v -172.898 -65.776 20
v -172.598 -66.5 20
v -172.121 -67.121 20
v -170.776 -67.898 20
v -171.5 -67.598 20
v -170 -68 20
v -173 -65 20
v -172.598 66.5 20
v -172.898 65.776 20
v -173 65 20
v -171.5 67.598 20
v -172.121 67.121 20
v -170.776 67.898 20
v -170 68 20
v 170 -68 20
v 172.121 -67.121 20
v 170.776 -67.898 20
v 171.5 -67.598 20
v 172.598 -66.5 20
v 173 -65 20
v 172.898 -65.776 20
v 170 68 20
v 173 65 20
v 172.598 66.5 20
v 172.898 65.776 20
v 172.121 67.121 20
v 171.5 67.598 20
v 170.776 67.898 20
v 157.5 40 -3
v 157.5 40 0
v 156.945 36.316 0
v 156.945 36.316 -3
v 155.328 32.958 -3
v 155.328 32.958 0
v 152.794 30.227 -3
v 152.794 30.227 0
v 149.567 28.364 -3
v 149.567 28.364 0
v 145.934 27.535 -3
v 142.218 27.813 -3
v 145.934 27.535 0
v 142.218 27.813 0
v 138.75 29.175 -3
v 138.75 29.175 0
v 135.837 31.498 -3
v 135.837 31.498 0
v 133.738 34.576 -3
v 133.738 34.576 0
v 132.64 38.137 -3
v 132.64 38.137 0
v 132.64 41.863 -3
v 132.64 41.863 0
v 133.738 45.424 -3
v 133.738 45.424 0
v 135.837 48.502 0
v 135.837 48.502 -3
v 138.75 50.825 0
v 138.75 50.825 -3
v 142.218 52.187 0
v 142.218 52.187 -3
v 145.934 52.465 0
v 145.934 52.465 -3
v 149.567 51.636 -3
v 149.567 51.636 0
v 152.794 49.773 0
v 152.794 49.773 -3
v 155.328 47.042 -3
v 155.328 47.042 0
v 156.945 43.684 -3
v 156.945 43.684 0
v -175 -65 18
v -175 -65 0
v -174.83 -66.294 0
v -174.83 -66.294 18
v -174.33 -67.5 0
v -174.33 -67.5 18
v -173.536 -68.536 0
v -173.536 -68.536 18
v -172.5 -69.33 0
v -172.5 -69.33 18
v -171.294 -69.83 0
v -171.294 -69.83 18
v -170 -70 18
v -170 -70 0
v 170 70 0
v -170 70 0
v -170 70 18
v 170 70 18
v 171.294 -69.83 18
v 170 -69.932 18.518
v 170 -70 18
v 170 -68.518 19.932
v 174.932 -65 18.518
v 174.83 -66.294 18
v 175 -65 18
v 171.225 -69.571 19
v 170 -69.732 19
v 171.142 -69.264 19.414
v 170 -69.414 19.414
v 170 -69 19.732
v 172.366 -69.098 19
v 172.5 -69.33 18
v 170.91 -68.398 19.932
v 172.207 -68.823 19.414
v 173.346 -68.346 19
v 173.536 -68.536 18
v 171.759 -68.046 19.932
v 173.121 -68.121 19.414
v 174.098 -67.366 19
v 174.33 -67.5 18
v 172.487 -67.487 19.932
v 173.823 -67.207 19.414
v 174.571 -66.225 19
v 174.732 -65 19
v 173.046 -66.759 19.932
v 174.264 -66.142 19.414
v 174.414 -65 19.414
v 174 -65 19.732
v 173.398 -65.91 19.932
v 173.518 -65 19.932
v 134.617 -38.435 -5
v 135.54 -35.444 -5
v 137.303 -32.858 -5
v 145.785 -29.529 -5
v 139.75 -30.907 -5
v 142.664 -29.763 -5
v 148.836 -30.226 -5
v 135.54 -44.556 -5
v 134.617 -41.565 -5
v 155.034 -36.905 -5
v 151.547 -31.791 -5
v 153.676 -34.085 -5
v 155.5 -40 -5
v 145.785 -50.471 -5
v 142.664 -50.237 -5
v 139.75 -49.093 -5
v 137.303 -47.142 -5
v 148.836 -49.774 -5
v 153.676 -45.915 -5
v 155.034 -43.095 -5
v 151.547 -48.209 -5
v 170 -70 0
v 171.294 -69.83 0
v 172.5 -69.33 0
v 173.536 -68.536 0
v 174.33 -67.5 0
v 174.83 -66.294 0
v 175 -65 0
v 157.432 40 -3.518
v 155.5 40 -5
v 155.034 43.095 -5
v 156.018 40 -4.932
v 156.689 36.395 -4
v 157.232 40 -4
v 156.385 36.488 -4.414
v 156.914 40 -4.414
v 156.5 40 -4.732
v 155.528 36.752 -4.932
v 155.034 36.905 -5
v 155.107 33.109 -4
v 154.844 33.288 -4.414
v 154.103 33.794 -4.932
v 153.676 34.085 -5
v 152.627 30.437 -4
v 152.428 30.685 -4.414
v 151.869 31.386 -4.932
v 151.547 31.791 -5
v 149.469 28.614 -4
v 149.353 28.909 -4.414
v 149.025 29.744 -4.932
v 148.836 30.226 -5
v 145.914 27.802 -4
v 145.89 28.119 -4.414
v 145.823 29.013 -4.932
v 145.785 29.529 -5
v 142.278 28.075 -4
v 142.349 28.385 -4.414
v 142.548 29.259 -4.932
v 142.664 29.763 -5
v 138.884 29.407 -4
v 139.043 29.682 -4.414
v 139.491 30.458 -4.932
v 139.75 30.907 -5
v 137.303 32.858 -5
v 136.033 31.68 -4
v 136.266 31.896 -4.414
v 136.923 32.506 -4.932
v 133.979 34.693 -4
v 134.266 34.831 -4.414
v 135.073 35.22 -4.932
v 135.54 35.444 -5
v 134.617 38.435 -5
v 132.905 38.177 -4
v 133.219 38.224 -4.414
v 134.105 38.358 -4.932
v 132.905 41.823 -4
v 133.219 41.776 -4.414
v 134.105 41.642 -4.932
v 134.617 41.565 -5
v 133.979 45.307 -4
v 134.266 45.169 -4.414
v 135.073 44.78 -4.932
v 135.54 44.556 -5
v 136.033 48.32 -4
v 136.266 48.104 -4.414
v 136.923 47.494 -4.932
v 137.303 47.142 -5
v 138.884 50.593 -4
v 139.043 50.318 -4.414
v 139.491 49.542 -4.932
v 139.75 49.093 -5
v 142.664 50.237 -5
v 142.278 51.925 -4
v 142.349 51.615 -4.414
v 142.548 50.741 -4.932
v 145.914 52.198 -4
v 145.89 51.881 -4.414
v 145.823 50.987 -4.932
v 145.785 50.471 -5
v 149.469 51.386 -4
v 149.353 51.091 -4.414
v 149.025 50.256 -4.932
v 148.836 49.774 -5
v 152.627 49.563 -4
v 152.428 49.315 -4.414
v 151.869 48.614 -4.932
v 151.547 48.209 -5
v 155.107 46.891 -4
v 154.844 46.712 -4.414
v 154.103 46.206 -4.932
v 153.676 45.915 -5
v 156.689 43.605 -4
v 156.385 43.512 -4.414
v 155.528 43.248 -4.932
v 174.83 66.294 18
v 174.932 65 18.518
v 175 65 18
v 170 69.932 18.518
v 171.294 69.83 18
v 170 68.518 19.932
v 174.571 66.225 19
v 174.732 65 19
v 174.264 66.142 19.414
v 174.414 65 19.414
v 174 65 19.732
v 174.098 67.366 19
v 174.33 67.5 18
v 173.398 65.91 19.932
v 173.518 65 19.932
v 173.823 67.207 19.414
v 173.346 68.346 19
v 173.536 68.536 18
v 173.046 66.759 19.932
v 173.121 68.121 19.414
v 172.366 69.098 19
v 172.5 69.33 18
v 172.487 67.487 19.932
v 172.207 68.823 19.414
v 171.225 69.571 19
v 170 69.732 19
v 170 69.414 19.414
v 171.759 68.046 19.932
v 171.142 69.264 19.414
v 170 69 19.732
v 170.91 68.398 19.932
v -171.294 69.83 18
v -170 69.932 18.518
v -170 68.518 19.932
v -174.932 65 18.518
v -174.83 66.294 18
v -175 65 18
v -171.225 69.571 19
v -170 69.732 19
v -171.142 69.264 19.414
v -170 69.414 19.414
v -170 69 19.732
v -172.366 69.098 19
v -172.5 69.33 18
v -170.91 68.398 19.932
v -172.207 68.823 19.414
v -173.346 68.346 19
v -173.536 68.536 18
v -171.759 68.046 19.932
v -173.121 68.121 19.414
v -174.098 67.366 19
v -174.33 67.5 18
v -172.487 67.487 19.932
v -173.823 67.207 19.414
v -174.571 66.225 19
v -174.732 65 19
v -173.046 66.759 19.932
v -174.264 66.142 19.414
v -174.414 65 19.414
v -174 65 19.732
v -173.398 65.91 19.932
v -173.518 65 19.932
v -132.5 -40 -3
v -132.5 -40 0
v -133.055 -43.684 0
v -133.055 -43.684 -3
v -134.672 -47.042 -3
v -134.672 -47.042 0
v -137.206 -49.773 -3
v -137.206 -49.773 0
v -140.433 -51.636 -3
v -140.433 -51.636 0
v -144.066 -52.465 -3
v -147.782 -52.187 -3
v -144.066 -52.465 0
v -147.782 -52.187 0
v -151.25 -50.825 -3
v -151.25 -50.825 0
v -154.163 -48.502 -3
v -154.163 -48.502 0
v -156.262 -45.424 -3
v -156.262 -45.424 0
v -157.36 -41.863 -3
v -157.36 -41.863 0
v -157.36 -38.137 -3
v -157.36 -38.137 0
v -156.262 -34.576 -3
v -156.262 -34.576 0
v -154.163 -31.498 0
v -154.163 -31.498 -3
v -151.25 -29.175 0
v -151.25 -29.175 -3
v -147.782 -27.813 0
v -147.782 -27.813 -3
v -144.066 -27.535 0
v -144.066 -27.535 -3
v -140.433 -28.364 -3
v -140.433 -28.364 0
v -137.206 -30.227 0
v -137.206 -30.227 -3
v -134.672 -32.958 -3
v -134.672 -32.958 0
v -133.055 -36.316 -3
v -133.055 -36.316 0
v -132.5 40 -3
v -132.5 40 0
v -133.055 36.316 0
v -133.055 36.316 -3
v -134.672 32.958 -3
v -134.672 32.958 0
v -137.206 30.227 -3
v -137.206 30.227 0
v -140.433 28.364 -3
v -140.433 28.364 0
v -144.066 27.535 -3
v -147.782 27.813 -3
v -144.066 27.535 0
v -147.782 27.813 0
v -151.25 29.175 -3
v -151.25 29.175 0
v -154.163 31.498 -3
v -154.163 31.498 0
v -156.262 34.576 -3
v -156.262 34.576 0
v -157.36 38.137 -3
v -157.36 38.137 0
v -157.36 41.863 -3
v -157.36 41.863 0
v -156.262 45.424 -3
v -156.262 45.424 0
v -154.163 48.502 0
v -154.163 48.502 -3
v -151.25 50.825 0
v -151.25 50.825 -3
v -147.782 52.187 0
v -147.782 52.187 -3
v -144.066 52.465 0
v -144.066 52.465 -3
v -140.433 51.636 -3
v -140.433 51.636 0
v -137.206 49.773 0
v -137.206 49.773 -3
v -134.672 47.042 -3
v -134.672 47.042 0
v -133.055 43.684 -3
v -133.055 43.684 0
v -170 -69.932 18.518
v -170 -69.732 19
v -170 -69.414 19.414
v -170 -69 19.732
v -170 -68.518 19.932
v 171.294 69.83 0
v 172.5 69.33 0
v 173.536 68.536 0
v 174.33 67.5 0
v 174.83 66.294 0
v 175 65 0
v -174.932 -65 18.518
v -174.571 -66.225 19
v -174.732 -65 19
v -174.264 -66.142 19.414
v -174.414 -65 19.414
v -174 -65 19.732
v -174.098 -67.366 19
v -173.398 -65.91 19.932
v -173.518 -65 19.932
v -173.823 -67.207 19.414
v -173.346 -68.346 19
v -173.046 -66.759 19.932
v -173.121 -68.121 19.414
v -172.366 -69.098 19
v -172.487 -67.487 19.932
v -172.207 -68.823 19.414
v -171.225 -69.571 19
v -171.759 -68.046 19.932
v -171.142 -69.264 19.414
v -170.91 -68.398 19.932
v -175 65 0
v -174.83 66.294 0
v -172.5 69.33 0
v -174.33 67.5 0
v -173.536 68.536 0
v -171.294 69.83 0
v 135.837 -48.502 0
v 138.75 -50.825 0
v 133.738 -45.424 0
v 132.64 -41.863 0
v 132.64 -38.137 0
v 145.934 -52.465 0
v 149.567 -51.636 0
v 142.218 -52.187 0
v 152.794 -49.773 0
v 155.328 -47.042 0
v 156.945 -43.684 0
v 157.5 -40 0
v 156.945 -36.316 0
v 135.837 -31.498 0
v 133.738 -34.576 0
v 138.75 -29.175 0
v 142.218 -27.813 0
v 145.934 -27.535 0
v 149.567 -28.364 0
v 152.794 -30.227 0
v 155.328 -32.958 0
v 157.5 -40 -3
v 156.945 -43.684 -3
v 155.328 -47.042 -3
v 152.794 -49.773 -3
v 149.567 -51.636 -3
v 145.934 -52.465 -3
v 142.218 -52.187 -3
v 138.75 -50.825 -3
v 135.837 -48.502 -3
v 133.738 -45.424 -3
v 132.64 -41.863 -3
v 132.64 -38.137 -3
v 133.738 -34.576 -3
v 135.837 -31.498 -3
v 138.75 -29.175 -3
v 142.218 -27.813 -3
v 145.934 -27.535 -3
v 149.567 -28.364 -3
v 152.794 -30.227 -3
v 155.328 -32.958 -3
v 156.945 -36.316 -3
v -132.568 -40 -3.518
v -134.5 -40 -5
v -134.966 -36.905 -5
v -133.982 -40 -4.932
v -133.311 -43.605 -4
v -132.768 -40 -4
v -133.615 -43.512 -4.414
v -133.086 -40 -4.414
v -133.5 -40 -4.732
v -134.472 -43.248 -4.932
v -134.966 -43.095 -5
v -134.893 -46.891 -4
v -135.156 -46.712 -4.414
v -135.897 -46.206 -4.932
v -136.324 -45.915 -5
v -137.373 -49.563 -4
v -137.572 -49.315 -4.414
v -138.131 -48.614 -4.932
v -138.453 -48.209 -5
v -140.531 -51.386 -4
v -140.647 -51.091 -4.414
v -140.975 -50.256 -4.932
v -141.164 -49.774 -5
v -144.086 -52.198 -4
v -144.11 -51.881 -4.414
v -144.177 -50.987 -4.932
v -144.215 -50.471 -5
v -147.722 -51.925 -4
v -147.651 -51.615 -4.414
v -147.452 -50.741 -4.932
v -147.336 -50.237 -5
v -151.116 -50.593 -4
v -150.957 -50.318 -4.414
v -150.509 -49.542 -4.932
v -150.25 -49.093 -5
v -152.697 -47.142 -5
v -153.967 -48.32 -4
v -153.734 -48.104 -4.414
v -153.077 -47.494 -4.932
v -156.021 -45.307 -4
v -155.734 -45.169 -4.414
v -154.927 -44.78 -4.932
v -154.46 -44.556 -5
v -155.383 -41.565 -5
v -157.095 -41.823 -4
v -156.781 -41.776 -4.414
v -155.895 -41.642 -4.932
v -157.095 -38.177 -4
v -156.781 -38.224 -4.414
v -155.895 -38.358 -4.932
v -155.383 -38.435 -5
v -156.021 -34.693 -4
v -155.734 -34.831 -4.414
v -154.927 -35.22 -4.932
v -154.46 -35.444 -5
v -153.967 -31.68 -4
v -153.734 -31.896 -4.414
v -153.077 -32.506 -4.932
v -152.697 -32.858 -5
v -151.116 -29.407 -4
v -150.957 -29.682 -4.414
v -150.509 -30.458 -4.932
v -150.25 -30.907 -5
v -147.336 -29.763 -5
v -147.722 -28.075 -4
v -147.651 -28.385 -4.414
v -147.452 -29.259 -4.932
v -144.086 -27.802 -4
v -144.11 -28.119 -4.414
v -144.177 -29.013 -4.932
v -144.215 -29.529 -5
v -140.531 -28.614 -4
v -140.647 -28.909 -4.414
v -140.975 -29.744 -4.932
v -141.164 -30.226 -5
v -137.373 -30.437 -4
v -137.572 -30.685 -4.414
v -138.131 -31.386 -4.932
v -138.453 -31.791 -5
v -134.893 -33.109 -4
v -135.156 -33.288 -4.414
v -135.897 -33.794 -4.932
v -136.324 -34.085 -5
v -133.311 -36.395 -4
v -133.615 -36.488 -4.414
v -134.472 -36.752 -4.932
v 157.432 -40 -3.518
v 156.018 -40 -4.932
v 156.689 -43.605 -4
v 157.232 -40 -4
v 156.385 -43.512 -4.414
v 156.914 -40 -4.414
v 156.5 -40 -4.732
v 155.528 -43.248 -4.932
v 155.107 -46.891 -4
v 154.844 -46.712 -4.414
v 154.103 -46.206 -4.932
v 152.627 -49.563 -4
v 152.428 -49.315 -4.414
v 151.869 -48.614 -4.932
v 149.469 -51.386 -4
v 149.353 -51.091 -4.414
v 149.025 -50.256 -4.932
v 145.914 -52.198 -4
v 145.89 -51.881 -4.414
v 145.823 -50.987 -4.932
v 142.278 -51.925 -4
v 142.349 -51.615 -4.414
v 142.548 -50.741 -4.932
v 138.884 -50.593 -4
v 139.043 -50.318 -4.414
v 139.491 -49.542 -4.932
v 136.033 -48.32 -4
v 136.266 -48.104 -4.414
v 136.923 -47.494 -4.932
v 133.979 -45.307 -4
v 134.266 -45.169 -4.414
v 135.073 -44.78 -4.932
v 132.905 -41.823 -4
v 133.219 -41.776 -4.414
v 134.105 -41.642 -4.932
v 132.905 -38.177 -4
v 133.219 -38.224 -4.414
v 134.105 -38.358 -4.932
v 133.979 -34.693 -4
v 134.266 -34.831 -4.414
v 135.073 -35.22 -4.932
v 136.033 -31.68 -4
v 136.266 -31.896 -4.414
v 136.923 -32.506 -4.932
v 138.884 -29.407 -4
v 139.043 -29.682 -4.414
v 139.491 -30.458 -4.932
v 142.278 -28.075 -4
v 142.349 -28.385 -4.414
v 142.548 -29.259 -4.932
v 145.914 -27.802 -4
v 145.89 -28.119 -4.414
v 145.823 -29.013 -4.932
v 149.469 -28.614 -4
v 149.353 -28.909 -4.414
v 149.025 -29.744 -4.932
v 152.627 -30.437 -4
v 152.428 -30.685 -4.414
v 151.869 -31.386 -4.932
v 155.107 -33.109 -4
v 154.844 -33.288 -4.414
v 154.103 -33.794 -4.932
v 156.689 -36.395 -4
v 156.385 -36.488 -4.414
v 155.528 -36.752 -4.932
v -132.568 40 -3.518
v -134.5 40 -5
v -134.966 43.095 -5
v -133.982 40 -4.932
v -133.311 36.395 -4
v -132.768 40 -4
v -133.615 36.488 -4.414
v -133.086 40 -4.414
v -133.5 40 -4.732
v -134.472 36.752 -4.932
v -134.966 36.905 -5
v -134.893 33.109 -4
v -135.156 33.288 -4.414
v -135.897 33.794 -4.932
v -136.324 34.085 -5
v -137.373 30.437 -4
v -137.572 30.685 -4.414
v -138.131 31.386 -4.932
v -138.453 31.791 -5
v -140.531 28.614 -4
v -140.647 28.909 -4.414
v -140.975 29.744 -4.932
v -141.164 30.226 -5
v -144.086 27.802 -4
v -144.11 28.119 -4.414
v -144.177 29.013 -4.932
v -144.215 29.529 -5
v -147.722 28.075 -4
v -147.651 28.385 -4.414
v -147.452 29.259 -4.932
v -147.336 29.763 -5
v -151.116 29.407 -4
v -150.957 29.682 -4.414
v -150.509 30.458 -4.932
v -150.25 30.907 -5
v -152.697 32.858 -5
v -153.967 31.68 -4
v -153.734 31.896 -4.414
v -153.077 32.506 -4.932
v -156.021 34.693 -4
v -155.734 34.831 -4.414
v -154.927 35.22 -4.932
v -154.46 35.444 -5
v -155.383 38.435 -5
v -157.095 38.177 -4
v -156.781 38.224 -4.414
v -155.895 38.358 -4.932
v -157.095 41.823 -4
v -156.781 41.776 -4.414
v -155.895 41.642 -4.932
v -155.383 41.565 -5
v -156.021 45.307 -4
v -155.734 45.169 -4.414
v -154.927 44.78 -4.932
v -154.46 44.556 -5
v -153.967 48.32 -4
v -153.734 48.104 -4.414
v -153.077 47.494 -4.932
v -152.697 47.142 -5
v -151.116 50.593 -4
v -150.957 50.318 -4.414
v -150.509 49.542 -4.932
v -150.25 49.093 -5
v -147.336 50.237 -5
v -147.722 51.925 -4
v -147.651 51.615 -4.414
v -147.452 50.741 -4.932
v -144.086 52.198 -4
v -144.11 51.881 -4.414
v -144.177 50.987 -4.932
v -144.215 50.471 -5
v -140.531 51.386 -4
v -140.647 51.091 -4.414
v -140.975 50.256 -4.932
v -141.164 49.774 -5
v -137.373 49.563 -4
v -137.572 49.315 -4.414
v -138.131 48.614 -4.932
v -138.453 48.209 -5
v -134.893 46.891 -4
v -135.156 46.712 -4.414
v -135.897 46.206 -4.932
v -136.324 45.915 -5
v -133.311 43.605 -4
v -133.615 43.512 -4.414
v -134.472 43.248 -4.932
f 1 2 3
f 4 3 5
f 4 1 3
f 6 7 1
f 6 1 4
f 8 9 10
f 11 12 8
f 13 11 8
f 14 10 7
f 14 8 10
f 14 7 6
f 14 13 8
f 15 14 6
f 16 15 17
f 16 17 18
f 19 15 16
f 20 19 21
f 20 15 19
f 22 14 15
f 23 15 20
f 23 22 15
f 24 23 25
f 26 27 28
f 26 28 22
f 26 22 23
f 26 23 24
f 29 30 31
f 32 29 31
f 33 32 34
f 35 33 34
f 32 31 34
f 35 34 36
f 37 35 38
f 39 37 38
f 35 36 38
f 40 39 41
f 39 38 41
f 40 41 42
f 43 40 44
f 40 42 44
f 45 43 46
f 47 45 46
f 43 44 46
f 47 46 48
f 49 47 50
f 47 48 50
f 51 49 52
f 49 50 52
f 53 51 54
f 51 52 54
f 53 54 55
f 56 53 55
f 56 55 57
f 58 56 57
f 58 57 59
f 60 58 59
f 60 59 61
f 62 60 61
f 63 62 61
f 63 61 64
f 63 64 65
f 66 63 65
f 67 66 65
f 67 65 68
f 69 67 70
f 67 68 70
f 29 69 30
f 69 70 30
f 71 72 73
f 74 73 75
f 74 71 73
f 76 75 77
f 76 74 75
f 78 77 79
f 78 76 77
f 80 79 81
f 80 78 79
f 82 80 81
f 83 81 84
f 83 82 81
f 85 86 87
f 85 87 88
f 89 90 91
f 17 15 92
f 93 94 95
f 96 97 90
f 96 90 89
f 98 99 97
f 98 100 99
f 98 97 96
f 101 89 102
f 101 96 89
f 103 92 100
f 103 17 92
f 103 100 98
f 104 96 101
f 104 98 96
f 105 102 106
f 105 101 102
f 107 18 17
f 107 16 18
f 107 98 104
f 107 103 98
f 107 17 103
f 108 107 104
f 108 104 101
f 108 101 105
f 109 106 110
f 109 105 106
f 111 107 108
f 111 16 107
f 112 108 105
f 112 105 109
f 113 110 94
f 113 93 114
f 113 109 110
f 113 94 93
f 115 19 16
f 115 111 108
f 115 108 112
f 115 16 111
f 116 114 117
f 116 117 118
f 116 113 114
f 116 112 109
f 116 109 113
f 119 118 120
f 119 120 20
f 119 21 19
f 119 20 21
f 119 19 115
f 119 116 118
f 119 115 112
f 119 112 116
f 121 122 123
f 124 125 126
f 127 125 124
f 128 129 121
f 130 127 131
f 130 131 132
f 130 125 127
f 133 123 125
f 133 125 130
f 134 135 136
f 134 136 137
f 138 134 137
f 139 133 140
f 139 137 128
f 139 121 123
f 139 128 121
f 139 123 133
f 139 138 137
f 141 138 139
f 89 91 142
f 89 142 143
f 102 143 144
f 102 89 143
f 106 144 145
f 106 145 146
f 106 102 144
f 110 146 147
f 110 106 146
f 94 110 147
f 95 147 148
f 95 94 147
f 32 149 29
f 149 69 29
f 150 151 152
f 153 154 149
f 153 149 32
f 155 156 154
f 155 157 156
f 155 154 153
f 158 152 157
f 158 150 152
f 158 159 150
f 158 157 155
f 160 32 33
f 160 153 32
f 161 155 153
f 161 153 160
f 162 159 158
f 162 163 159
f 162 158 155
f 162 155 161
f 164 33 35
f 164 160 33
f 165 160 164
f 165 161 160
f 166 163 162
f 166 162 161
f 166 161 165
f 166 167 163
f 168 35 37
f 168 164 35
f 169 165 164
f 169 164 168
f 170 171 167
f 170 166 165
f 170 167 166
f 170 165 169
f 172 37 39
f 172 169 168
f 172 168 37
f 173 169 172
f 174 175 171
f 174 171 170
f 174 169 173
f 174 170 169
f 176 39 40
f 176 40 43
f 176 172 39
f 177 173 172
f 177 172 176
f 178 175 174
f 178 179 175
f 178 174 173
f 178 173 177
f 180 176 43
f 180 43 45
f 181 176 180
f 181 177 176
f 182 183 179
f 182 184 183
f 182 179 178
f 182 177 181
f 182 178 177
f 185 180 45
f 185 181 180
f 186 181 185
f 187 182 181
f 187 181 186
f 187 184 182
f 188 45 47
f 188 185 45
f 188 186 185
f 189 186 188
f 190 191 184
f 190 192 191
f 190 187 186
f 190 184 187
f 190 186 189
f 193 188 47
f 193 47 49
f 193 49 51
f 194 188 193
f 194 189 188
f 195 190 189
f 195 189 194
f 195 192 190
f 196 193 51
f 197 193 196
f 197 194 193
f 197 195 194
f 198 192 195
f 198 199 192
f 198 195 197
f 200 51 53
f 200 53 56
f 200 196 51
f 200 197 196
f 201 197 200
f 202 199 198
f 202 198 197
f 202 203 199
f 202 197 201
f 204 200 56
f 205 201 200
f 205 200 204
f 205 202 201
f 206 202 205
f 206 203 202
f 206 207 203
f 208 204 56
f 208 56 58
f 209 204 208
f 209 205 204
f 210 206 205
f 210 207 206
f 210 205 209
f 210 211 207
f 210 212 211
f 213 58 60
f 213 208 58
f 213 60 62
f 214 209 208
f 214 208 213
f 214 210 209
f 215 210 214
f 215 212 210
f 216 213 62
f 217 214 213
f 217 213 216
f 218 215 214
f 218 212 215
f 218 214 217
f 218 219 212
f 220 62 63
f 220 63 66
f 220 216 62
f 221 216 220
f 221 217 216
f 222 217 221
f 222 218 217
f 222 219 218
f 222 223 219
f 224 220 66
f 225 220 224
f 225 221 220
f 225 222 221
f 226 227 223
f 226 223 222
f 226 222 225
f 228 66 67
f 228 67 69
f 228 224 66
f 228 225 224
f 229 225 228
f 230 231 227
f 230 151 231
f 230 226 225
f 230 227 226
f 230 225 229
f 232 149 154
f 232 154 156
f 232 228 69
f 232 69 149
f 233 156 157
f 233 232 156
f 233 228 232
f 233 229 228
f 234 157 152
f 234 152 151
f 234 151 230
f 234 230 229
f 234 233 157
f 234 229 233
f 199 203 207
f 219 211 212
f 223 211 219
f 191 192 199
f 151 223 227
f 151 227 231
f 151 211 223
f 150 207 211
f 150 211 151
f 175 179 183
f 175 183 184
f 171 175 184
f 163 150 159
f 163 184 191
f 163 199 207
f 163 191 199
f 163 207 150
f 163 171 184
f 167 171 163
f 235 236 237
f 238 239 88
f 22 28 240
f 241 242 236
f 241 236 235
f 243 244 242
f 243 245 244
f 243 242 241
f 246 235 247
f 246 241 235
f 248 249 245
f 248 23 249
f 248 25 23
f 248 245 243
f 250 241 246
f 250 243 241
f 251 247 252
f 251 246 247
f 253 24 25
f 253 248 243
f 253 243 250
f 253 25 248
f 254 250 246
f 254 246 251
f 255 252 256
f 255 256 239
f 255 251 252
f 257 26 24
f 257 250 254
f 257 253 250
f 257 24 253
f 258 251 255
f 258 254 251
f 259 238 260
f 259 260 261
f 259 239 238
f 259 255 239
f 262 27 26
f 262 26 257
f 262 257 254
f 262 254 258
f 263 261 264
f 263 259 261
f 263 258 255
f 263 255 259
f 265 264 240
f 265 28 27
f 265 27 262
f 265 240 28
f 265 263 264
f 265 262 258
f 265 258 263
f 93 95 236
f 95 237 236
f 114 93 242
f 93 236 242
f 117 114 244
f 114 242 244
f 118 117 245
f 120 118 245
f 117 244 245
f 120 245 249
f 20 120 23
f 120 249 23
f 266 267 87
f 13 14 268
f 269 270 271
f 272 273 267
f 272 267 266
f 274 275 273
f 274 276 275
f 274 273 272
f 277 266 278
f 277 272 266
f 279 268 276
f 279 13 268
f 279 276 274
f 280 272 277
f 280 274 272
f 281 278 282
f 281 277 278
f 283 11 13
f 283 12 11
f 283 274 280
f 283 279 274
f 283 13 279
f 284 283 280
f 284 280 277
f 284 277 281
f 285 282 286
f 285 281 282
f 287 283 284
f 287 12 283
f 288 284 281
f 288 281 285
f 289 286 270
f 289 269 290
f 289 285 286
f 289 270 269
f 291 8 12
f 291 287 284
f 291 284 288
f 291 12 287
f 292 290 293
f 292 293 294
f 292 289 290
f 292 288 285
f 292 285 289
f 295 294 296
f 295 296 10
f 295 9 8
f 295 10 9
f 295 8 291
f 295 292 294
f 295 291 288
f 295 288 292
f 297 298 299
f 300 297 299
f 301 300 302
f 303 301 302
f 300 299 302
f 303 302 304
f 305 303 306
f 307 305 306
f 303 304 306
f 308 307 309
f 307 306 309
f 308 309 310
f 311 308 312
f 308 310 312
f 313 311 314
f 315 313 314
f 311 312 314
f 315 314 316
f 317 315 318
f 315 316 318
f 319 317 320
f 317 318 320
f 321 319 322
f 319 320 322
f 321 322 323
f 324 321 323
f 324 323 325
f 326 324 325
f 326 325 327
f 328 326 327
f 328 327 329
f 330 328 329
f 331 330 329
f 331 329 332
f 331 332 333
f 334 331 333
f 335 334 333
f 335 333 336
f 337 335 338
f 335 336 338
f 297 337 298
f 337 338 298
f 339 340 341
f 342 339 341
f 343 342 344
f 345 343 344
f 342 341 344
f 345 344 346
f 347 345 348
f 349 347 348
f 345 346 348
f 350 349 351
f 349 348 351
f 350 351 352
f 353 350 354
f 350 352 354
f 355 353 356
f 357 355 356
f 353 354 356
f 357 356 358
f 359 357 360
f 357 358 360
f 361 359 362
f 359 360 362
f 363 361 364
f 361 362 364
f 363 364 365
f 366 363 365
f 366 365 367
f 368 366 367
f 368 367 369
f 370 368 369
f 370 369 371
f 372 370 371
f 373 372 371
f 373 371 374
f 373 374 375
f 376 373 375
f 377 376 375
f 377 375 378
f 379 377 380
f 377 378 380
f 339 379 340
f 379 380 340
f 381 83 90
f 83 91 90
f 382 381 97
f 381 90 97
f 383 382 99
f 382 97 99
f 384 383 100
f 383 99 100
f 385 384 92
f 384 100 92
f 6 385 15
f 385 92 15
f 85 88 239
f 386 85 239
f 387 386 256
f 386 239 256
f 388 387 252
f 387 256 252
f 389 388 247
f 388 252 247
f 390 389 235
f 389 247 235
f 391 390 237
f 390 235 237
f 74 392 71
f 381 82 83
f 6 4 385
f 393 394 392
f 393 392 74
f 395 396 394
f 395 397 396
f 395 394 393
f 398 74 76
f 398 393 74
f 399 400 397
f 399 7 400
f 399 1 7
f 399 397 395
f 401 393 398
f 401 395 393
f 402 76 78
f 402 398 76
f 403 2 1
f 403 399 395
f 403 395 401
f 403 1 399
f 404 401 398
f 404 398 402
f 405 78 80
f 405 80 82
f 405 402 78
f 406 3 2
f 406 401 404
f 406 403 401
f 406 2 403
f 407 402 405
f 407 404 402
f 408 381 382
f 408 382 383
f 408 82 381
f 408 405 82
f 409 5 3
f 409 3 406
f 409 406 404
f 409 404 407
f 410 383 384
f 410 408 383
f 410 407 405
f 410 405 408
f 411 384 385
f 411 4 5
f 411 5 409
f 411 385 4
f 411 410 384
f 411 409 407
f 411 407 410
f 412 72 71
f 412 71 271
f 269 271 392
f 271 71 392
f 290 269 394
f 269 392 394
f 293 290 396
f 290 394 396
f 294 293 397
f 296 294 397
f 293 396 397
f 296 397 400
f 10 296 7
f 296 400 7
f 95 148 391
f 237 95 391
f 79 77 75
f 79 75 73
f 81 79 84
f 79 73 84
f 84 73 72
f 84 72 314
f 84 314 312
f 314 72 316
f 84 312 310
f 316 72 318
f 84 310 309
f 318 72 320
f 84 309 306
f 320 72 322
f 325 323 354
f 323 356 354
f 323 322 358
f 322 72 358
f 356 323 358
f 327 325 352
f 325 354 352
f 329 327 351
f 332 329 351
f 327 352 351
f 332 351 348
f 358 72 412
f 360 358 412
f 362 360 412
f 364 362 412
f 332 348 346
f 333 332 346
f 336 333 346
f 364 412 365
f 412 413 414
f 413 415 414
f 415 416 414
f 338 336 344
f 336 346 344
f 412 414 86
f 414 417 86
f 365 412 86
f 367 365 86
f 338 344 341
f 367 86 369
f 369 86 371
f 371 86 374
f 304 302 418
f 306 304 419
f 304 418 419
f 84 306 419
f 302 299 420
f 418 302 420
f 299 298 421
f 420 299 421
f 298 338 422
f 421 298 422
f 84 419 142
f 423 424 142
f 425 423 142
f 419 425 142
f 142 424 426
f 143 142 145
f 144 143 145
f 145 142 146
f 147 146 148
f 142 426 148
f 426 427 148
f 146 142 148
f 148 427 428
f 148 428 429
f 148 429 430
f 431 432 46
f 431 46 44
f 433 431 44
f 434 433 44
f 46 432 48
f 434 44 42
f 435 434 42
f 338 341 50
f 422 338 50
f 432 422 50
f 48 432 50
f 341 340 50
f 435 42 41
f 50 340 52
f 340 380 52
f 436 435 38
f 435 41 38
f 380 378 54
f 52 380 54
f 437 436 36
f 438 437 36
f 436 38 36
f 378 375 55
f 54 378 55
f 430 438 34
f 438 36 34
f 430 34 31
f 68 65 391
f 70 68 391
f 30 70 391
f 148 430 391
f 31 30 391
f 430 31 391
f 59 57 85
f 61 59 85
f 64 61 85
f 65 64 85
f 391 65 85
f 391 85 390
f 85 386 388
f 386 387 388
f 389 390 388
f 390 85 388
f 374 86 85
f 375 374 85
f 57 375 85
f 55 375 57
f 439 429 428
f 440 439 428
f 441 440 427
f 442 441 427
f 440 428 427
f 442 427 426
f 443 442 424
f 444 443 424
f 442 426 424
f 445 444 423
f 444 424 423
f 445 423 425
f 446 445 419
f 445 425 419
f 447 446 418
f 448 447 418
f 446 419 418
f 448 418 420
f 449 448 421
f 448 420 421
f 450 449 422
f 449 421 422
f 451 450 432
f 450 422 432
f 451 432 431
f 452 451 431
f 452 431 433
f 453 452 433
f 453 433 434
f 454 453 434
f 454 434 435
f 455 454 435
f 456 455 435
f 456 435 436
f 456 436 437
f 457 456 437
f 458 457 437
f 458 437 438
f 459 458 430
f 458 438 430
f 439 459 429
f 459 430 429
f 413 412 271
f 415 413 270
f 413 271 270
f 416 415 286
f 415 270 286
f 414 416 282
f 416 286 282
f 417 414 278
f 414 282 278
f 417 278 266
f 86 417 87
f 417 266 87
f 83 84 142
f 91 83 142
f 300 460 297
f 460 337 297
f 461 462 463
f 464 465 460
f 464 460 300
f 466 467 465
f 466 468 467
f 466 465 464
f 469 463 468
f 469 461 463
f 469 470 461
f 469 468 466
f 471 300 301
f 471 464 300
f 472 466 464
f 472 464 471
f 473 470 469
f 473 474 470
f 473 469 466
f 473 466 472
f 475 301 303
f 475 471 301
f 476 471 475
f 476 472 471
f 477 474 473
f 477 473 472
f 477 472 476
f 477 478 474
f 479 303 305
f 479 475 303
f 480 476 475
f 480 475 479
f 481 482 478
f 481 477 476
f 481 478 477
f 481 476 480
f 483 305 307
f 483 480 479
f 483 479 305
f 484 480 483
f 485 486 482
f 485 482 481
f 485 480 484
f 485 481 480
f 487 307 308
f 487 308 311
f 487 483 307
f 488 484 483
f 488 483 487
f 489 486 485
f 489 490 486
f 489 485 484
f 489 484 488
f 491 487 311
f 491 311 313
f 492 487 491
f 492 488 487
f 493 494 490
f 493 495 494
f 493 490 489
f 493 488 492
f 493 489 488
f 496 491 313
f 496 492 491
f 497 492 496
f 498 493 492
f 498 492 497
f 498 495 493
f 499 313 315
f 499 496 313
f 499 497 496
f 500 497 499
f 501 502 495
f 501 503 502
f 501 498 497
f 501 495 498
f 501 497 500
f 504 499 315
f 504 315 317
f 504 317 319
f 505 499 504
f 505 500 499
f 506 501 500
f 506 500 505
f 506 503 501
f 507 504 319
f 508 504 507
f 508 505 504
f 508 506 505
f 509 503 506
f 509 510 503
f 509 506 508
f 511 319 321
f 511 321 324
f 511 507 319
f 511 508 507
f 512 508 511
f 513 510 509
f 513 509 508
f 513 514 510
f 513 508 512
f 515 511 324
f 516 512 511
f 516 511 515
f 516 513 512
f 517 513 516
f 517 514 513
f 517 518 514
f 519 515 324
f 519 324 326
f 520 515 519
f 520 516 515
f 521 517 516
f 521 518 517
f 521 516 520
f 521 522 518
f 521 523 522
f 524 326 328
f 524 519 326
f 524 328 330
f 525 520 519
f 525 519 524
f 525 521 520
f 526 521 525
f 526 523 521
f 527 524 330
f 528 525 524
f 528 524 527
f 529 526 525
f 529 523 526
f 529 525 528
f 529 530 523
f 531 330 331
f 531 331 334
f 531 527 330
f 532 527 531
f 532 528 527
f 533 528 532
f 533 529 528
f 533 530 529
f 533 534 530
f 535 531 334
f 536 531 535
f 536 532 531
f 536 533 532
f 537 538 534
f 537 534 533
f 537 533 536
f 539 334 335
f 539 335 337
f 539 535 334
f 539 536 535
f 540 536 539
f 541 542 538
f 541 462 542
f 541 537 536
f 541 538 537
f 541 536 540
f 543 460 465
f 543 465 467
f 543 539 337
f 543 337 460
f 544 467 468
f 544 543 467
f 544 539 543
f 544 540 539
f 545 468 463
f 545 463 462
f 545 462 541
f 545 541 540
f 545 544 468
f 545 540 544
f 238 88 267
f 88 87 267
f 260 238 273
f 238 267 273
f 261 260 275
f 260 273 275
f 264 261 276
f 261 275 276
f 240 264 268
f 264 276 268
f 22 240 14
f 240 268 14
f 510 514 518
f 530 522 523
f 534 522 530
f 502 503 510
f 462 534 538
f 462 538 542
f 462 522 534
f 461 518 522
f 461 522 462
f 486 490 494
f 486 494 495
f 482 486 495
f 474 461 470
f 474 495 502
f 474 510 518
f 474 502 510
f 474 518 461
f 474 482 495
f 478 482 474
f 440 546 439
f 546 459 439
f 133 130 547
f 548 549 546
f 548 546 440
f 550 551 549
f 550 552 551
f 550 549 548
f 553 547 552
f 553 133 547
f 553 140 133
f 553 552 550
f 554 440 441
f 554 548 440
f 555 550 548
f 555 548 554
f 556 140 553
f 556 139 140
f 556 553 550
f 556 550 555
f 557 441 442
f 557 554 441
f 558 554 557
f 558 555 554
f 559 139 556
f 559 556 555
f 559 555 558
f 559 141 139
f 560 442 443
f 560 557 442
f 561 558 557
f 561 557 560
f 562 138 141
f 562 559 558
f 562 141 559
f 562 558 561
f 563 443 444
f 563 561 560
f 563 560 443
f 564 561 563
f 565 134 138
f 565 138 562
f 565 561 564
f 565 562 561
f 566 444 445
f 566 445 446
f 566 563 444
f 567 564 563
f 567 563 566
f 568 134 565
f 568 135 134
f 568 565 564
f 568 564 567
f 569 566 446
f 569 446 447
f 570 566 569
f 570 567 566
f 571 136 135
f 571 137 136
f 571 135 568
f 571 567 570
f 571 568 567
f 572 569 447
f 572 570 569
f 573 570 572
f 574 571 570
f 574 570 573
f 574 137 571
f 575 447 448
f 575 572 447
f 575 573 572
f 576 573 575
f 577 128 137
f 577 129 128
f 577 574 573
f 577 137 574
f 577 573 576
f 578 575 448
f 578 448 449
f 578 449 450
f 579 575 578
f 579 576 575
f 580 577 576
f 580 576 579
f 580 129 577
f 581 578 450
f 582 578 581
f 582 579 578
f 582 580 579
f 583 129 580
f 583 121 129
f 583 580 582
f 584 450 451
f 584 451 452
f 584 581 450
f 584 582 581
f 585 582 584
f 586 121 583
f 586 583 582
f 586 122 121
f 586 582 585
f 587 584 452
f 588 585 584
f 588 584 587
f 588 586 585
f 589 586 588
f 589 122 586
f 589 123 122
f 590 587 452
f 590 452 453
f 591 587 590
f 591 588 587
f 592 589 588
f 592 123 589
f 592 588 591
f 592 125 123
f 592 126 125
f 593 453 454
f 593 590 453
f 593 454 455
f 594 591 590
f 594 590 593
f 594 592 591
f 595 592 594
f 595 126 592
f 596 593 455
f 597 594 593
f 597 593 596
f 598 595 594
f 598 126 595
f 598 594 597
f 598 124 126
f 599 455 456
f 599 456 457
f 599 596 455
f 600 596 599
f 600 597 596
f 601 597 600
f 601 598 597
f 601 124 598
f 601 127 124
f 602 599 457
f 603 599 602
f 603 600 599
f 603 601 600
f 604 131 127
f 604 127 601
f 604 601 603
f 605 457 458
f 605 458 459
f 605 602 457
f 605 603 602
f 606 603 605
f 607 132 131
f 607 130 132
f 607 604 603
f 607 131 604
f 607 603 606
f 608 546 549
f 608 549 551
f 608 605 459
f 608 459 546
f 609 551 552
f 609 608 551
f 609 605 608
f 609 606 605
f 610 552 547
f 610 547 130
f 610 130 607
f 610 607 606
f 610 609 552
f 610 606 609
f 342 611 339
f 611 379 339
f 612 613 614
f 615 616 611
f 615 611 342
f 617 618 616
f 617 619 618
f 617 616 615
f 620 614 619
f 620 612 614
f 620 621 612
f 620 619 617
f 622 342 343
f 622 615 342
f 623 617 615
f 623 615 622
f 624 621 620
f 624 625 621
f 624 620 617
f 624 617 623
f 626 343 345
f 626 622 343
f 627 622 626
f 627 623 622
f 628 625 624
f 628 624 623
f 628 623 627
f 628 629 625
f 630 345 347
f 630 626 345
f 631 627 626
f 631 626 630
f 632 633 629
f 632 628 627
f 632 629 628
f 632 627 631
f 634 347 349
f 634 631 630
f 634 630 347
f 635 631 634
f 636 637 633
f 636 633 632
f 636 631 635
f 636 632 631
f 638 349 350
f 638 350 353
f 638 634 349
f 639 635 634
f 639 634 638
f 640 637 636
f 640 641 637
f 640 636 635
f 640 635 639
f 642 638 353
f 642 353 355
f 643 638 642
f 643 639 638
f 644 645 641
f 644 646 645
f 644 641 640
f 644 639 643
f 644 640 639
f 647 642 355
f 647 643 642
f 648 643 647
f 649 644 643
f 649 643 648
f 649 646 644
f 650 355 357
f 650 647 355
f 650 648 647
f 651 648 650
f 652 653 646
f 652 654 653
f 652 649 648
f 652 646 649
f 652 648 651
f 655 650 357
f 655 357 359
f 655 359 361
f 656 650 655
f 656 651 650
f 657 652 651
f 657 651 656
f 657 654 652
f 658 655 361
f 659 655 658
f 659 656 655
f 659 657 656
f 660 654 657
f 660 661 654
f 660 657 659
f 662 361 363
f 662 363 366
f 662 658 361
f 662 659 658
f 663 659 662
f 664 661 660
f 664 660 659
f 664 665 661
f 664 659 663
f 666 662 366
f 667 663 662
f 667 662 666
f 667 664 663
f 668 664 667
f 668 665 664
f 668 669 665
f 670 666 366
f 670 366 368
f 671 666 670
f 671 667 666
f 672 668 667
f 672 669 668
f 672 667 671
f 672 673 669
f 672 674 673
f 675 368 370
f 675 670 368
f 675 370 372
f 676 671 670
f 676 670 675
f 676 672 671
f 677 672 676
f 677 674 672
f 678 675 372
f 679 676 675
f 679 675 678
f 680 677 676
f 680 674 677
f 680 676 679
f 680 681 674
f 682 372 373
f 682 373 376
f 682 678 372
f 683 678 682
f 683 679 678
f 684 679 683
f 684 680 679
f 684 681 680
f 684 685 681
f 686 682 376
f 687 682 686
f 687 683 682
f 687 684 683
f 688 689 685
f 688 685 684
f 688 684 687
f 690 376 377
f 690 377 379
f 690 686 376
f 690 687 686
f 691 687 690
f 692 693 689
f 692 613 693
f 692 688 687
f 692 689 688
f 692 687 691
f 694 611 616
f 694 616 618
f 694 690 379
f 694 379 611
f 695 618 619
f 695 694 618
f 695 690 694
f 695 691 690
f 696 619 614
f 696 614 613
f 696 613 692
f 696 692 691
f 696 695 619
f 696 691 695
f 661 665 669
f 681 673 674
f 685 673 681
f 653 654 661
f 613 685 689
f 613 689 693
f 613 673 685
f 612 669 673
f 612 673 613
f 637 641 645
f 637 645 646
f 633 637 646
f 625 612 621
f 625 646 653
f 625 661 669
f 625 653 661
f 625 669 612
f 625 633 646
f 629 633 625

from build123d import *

# Parameters (mm, degrees)
F0_W     = 350
F0_H     = 140
F1_DEPTH = 20
F2_R     = 12.5
F3_DEPTH = 5
F4_R     = 2
F5_R     = 5
F6_R     = 2


with BuildPart() as f1:
    # F0 (on Top) → F1 (new body)
    with BuildSketch(Plane.XY):
        Rectangle(F0_W, F0_H)
    extrude(amount=F1_DEPTH)

    # F2 (on face) → F3 (join)
    with BuildSketch(Plane(origin=(0, 0, 0), x_dir=(1, 0, 0), z_dir=(0, 0, -1))):
        with Locations((145, 40)):
            Circle(F2_R)
        with Locations((145, -40)):
            Circle(F2_R)
        with Locations((-145, 40)):
            Circle(F2_R)
        with Locations((-145, -40)):
            Circle(F2_R)
    extrude(amount=F3_DEPTH)

    # F4
    f4_edges = [f1.edges().sort_by_distance(p)[0] for p in [
        (-157.5, -40, -5),
        (-157.5, 40, -5),
        (132.5, 40, -5),
        (132.5, -40, -5),
    ]]
    fillet(f4_edges, radius=F4_R)

    # F5
    f5_edges = [f1.edges().sort_by_distance(p)[0] for p in [
        (-175, -70, 10),
        (-175, 70, 10),
        (175, -70, 10),
        (175, 70, 10),
    ]]
    fillet(f5_edges, radius=F5_R)

    # F6
    f6_edges = [f1.edges().sort_by_distance(p)[0] for p in [
        (175, 0, 20),
    ]]
    fillet(f6_edges, radius=F6_R)


solid = f1.part
